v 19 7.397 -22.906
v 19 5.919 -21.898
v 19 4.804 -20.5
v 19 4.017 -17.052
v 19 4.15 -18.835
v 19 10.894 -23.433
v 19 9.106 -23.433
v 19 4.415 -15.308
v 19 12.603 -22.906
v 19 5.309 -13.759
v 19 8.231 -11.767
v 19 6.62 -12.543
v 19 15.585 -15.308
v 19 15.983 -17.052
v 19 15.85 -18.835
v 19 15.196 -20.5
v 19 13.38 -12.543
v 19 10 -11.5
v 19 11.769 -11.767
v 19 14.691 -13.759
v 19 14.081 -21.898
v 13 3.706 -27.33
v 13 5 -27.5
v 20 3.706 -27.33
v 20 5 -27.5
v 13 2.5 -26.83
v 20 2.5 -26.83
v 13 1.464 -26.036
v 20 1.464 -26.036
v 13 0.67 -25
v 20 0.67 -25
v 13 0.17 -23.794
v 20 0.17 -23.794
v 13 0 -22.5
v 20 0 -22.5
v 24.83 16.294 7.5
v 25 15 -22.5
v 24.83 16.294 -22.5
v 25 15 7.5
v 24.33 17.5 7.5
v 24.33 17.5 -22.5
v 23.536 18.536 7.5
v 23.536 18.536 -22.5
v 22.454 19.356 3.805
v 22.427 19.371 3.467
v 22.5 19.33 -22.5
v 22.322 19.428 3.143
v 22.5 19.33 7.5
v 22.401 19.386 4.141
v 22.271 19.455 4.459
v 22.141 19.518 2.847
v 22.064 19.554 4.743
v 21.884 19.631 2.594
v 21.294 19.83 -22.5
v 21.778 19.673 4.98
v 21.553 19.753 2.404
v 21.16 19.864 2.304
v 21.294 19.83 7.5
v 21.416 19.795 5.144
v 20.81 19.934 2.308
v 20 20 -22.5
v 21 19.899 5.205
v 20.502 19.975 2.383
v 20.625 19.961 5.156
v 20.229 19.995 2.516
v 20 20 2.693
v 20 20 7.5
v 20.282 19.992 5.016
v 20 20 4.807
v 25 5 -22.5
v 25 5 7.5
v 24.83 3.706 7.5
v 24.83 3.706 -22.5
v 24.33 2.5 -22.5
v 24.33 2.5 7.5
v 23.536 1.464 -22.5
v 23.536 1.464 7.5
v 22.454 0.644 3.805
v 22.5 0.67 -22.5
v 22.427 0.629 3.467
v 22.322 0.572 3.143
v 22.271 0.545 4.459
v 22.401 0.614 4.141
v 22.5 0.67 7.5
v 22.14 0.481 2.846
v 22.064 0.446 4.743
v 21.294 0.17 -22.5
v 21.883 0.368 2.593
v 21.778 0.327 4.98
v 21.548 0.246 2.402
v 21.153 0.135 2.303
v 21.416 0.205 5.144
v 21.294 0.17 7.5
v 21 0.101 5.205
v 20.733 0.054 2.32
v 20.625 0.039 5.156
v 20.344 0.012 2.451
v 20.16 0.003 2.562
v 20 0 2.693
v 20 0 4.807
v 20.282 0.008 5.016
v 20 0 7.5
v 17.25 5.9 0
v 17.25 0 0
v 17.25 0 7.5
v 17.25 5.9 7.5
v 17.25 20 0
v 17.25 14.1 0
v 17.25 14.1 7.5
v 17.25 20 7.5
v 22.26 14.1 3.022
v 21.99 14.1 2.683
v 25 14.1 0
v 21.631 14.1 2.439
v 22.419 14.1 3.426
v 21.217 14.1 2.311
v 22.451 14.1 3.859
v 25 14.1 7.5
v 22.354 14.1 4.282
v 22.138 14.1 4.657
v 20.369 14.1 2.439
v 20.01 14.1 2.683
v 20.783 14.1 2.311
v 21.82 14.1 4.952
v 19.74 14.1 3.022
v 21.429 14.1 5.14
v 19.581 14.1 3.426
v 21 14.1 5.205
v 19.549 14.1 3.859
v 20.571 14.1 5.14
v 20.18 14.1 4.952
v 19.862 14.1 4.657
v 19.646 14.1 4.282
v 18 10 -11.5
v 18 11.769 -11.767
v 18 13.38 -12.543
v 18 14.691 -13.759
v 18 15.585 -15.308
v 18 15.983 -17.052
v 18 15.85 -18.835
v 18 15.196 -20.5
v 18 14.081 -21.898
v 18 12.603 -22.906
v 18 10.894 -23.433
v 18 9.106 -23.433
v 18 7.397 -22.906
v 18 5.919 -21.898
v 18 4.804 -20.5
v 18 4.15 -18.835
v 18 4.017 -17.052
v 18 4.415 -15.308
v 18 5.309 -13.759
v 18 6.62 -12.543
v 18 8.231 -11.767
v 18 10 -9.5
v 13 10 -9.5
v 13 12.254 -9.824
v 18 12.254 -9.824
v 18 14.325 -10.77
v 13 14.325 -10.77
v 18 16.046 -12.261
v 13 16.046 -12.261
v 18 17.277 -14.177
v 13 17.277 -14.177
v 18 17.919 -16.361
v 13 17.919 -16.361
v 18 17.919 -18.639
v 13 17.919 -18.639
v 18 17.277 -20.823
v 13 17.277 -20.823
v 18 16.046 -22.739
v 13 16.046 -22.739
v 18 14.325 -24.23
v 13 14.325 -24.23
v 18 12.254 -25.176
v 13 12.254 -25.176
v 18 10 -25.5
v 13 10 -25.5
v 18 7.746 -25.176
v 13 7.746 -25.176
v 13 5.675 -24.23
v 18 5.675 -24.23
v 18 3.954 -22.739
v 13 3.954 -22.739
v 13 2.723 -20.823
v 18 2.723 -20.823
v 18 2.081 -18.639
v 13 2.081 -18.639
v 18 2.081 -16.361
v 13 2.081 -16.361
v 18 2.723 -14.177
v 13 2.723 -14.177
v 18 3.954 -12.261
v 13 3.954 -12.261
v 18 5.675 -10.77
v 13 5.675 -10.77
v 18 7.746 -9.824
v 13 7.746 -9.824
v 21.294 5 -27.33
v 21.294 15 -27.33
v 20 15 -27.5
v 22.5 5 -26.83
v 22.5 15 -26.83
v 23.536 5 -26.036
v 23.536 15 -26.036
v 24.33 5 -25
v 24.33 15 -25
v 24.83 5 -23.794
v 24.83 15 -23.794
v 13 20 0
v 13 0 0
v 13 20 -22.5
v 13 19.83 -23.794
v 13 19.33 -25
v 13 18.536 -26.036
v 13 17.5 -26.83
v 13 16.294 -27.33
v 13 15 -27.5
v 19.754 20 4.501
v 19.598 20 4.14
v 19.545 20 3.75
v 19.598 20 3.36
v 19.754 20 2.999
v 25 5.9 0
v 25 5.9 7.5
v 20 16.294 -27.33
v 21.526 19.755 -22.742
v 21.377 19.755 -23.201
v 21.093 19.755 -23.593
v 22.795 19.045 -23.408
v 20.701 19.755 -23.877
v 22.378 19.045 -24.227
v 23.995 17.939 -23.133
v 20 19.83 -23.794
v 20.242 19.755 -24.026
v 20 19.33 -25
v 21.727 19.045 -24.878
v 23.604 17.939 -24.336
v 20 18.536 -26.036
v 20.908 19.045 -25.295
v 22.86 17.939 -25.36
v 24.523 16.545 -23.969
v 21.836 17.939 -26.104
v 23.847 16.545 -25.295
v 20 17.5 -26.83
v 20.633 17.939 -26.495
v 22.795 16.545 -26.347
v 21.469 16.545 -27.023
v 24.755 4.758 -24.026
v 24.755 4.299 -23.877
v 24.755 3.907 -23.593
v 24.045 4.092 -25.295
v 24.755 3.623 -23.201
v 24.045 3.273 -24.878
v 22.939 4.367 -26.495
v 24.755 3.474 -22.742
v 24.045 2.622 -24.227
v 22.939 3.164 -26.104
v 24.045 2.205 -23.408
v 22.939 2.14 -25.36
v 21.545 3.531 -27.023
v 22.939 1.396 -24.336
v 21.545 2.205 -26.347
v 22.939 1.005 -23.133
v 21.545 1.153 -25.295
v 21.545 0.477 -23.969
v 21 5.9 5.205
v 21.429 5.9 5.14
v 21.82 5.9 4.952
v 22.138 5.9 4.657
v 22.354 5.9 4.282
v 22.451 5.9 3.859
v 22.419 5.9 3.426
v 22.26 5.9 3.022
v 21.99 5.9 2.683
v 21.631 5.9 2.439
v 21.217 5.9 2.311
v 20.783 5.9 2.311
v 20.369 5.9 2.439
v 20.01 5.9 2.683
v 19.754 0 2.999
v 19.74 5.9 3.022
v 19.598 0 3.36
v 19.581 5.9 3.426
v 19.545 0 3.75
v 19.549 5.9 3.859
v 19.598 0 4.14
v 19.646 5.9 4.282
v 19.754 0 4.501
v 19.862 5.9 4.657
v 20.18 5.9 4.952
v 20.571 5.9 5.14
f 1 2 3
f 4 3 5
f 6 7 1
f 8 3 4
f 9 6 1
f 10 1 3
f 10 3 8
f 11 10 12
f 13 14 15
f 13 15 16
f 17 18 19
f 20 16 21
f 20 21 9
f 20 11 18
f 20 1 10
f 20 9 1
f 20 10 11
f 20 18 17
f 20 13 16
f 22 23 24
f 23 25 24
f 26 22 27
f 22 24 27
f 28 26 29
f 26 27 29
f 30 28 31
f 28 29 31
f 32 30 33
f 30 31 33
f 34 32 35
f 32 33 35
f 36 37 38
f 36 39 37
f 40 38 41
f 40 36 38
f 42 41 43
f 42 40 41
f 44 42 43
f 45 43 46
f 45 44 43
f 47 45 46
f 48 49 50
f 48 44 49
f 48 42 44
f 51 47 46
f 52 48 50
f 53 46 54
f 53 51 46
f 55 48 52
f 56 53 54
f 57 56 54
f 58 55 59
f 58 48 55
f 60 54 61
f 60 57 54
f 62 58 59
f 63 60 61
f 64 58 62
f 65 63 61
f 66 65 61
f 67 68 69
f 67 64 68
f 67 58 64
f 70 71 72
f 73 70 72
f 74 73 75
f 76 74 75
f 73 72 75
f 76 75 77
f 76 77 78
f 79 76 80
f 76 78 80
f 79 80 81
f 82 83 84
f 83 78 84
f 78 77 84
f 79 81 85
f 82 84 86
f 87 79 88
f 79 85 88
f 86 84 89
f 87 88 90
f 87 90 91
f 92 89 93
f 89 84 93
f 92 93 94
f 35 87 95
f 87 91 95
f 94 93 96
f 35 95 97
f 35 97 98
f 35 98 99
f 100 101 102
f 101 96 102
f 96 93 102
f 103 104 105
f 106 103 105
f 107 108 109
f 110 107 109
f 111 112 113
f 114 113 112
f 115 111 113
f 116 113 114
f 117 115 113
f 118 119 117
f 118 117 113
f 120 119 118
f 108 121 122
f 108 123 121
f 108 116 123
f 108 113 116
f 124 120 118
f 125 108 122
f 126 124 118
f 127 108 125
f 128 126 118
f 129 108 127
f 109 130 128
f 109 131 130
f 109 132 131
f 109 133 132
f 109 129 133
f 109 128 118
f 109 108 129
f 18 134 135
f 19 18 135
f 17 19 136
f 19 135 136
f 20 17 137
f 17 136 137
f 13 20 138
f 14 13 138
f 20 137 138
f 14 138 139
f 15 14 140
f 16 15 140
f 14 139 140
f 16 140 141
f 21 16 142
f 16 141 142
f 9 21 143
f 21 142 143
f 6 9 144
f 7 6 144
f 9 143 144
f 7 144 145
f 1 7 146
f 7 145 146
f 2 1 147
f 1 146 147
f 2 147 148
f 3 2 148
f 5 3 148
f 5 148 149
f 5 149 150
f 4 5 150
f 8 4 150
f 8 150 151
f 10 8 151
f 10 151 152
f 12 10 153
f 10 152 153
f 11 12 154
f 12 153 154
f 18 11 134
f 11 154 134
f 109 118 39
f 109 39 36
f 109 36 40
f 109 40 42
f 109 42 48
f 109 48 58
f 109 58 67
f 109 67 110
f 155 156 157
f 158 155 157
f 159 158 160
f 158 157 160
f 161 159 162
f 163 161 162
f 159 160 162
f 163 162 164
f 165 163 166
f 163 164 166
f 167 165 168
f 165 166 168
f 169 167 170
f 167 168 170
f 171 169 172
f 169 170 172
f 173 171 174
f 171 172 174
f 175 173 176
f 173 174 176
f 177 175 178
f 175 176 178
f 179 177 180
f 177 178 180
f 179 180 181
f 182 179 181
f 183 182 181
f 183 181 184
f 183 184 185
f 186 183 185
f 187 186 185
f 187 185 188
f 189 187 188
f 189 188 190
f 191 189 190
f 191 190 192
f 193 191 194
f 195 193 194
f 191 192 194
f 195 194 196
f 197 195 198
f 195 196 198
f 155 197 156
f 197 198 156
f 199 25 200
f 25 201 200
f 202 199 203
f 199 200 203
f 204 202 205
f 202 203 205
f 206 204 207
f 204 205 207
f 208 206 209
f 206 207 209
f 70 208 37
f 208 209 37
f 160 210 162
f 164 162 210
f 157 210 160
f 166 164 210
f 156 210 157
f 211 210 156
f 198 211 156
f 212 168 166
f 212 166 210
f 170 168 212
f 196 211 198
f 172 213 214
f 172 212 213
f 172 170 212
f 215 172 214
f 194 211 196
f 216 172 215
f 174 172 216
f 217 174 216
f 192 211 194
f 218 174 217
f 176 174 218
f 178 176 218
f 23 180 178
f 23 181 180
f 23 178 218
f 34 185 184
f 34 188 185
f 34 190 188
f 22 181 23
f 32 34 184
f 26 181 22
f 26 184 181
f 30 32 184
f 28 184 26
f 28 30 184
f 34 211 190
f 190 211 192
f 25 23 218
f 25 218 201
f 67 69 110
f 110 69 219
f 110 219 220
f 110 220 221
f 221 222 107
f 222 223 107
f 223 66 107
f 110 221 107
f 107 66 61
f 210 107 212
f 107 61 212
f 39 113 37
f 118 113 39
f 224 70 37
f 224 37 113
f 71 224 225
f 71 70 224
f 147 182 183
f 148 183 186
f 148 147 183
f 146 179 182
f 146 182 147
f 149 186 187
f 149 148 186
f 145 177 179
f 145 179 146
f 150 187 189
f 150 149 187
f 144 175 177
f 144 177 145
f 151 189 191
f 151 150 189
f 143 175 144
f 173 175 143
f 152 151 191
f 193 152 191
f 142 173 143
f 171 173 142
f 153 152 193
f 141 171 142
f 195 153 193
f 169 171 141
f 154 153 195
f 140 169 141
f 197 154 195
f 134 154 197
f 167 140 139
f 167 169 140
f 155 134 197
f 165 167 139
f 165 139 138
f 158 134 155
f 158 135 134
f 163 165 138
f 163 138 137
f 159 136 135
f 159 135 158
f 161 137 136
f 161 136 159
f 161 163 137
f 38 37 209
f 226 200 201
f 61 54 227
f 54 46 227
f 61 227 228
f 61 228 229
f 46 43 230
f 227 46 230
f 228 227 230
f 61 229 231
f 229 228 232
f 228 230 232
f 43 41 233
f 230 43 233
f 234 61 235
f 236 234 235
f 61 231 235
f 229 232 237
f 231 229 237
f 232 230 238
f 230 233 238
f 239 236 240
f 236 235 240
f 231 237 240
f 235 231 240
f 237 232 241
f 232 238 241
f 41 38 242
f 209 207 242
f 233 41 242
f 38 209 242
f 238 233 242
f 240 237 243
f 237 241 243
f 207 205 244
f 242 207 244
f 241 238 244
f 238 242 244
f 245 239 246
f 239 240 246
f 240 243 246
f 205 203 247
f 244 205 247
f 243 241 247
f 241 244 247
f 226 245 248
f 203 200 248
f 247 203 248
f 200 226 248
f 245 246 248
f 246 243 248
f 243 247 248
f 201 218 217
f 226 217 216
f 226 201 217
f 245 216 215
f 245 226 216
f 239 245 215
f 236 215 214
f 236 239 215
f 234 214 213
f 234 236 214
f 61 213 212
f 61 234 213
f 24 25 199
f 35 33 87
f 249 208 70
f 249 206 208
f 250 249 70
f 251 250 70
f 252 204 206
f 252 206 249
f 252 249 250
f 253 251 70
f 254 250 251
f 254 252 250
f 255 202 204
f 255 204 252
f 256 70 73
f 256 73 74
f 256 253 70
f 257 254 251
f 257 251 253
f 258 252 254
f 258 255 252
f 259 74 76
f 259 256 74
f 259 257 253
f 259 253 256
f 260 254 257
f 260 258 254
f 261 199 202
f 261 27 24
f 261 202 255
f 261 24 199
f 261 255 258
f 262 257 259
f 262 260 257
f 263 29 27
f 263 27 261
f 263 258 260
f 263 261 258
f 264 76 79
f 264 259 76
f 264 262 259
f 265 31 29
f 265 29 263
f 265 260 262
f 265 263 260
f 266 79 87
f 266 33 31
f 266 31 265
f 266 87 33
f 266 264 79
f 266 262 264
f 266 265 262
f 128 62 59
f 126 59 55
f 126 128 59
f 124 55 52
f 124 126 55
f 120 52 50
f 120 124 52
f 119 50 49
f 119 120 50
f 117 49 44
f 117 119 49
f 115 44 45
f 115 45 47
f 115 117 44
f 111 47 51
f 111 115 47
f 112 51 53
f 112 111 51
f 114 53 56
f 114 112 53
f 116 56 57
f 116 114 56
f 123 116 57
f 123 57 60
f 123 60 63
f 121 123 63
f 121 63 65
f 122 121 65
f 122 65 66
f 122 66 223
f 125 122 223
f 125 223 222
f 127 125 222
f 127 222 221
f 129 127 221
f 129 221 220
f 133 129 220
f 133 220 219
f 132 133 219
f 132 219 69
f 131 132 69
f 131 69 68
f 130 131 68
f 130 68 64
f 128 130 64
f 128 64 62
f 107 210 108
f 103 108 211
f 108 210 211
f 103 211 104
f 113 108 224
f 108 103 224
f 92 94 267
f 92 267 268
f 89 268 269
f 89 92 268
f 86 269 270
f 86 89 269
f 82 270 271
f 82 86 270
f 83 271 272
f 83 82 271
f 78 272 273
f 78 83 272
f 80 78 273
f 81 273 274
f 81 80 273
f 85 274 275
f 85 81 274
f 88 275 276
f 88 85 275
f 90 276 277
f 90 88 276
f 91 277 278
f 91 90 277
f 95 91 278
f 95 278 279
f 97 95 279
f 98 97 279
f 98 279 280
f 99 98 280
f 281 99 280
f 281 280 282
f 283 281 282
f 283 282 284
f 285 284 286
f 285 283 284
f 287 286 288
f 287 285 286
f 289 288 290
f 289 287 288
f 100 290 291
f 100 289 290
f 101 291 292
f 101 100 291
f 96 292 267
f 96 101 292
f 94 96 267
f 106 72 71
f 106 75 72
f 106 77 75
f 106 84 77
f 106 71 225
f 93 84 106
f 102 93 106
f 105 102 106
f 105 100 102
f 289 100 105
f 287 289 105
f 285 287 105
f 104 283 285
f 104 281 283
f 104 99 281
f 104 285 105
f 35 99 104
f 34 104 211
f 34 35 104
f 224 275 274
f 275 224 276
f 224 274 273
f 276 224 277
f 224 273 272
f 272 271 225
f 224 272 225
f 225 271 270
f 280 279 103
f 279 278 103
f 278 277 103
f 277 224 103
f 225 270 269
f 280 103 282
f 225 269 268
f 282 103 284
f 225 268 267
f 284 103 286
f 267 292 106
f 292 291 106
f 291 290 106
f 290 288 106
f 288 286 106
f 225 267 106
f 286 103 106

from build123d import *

# Parameters (mm, degrees)
EXTRUDE_1_DEPTH           = 20
FILLET_1_R                = 5
SKETCH_2_R                = 8
CUT_EXTRUDE_1_DEPTH       = 5
SKETCH_3_R                = 6
CUT_EXTRUDE_2_DEPTH       = 1
CUT_EXTRUDE_3_DEPTH       = 5
CUT_EXTRUDE_4_DEPTH       = 5
SKETCH_6_R                = 0.625
CUT_EXTRUDE_5_DEPTH       = 4
SKETCH_7_W                = 27
SKETCH_7_H                = 5
CUT_EXTRUDE_6_DEPTH       = 7
SKETCH_8_R                = 1.45
CUT_EXTRUDE_7_DEPTH       = 12
CUT_EXTRUDE_8_DEPTH       = 43.204857647
SKETCH_10_W               = 7.5
SKETCH_10_H               = 8.2
CUT_EXTRUDE_9_DEPTH       = 35.875672037
CUT_EXTRUDE_10_DEPTH      = 40.749968553
CUT_EXTRUDE_10_DEPTH_BACK = 40.749968553
SKETCH_11_R               = 1.455


with BuildPart() as part:
    # Эскиз1 → Бобышка-Вытянуть1 (new body)
    with BuildSketch(Plane(origin=(0, 0, 0), x_dir=(1, 0, 0), z_dir=(0, 1, 0))):
        Polygon((-13, 27.5), (-13, 0), (13, 0), (13, 27.5), (25, 27.5), (25, -7.5), (-25, -7.5), (-25, 27.5), align=None)
    extrude(amount=EXTRUDE_1_DEPTH)

    # Скругление1
    fillet_1_edges = [part.edges().sort_by_distance(p)[0] for p in [
        (19, 0, -27.5),
        (25, 10, -27.5),
        (-25, 10, -27.5),
        (-19, 20, -27.5),
        (-25, 20, -10),
        (25, 20, -10),
        (19, 20, -27.5),
        (25, 0, -10),
        (-25, 0, -10),
        (-19, 0, -27.5),
    ]]
    fillet(fillet_1_edges, radius=FILLET_1_R)

    # Эскиз2 → Вырез-Вытянуть1 (cut)
    with BuildSketch(Plane.ZY.offset(-13)):
        with Locations((-17.5, 10)):
            Circle(SKETCH_2_R)
    extrude(amount=-CUT_EXTRUDE_1_DEPTH, mode=Mode.SUBTRACT)

    # Эскиз3 → Вырез-Вытянуть2 (cut)
    with BuildSketch(Plane.ZY.offset(-18)):
        with Locations((-17.5, 10)):
            Circle(SKETCH_3_R)
    extrude(amount=-CUT_EXTRUDE_2_DEPTH, mode=Mode.SUBTRACT)

    # Эскиз4 → Вырез-Вытянуть3 (cut)
    with BuildSketch(Plane(origin=(-13, 0, 0), x_dir=(0, 0, -1), z_dir=(1, 0, 0))):
        with BuildLine():
            Line((13.195, 19.30212207), (2.9, 14.537620522))
            ThreePointArc((2.9, 14.537620522), (0, 10), (2.9, 5.462379478))
            Line((2.9, 5.462379478), (13.195, 0.69787793))
            ThreePointArc((13.195, 0.69787793), (27.75, 10), (13.195, 19.30212207))
        make_face()
    extrude(amount=-CUT_EXTRUDE_3_DEPTH, mode=Mode.SUBTRACT)

    # Эскиз5 → Вырез-Вытянуть4 (cut)
    with BuildSketch(Plane(origin=(-18, 0, 0), x_dir=(0, 0, -1), z_dir=(1, 0, 0))):
        with BuildLine():
            Line((19.4, 15.812916652), (19.4, 16.49838717))
            ThreePointArc((19.4, 16.49838717), (17.499999842, 18.39838717), (15.6, 16.498386854))
            Line((15.6, 16.498386854), (15.6, 15.665366642))
            ThreePointArc((15.6, 15.665366642), (15.094249889, 14.335999398), (13.832782732, 13.678959785))
            Line((13.832782732, 13.678959785), (1.932299859, 12.284367885))
            ThreePointArc((1.932299859, 12.284367885), (-0.1, 10), (1.932299859, 7.715632115))
            Line((1.932299859, 7.715632115), (13.832782732, 6.321040215))
            ThreePointArc((13.832782732, 6.321040215), (15.094249889, 5.664000602), (15.6, 4.334633358))
            Line((15.6, 4.334633358), (15.6, 3.501613146))
            ThreePointArc((15.6, 3.501613146), (17.5, 1.601613146), (19.4, 3.501613146))
            Line((19.4, 3.501613146), (19.4, 4.187083665))
            ThreePointArc((19.4, 4.187083665), (19.635266181, 5.128207436), (20.285714286, 5.847916677))
            ThreePointArc((20.285714286, 5.847916677), (22.5, 10), (20.285714286, 14.152083323))
            ThreePointArc((20.285714286, 14.152083323), (19.635266107, 14.871792704), (19.4, 15.812916652))
        make_face()
    extrude(amount=-CUT_EXTRUDE_4_DEPTH, mode=Mode.SUBTRACT)

    # Эскиз6 → Вырез-Вытянуть5 (cut)
    with BuildSketch(Plane(origin=(-23, 0, 0), x_dir=(0, 0, -1), z_dir=(1, 0, 0))):
        with Locations((2.278018202, 10)):
            Circle(SKETCH_6_R)
        with Locations((6.311115384, 10)):
            Circle(SKETCH_6_R)
        with Locations((10.428235425, 10)):
            Circle(SKETCH_6_R)
        with Locations((17.5, 14.907931149)):
            Circle(SKETCH_6_R)
        with Locations((17.5, 16.848859168)):
            Circle(SKETCH_6_R)
        with Locations((17.5, 5.082068851)):
            Circle(SKETCH_6_R)
        with Locations((17.5, 3.141140832)):
            Circle(SKETCH_6_R)
    extrude(amount=-CUT_EXTRUDE_5_DEPTH, mode=Mode.SUBTRACT)

    # Эскиз7 → Вырез-Вытянуть6 (cut)
    with BuildSketch(Plane.XY.offset(7.5)):
        with Locations((0, 17.5)):
            Rectangle(SKETCH_7_W, SKETCH_7_H)
        with Locations((0, 2.5)):
            Rectangle(SKETCH_7_W, SKETCH_7_H)
    extrude(amount=-CUT_EXTRUDE_6_DEPTH, mode=Mode.SUBTRACT)

    # Эскиз8 → Вырез-Вытянуть7 (cut)
    with BuildSketch(Plane(origin=(0, 15, 0), x_dir=(1, 0, 0), z_dir=(0, 1, 0))):
        with Locations(Location((-8.5, -4, 0), (0, 0, 270))):
            Circle(SKETCH_8_R)
        with Locations(Location((8.5, -4, 0), (0, 0, 270))):
            Circle(SKETCH_8_R)
    extrude(amount=-CUT_EXTRUDE_7_DEPTH, mode=Mode.SUBTRACT)

    # Эскиз9 → Вырез-Вытянуть8 (cut, through all)
    with BuildSketch(Plane.XZ):
        Polygon((13, 0), (17.25, 0), (17.25, 7.5), (-36.683406806, 12.049060371), (-29.579948377, -33.351304372), (-5.181112902, -33.351304372), (8.202214573, -2.26080516), align=None)
    extrude(amount=-CUT_EXTRUDE_8_DEPTH, mode=Mode.SUBTRACT)

    # Эскиз10 → Вырез-Вытянуть9 (cut, through all)
    with BuildSketch(Plane.ZY.offset(-17.25)):
        with Locations((3.75, 10)):
            Rectangle(SKETCH_10_W, SKETCH_10_H)
    extrude(amount=-CUT_EXTRUDE_9_DEPTH, mode=Mode.SUBTRACT)

    # Эскиз11 → Вырез-Вытянуть10 (cut, two sides: drawn at the far end of the back side and taken through both)
    with BuildSketch(Plane(origin=(0, 5.9, 0), x_dir=(1, 0, 0), z_dir=(0, 1, 0)).offset(-CUT_EXTRUDE_10_DEPTH_BACK)):
        with Locations(Location((21, -3.75, 0), (0, 0, 270))):
            Circle(SKETCH_11_R)
    extrude(amount=CUT_EXTRUDE_10_DEPTH + CUT_EXTRUDE_10_DEPTH_BACK, mode=Mode.SUBTRACT)


solid = part.part
